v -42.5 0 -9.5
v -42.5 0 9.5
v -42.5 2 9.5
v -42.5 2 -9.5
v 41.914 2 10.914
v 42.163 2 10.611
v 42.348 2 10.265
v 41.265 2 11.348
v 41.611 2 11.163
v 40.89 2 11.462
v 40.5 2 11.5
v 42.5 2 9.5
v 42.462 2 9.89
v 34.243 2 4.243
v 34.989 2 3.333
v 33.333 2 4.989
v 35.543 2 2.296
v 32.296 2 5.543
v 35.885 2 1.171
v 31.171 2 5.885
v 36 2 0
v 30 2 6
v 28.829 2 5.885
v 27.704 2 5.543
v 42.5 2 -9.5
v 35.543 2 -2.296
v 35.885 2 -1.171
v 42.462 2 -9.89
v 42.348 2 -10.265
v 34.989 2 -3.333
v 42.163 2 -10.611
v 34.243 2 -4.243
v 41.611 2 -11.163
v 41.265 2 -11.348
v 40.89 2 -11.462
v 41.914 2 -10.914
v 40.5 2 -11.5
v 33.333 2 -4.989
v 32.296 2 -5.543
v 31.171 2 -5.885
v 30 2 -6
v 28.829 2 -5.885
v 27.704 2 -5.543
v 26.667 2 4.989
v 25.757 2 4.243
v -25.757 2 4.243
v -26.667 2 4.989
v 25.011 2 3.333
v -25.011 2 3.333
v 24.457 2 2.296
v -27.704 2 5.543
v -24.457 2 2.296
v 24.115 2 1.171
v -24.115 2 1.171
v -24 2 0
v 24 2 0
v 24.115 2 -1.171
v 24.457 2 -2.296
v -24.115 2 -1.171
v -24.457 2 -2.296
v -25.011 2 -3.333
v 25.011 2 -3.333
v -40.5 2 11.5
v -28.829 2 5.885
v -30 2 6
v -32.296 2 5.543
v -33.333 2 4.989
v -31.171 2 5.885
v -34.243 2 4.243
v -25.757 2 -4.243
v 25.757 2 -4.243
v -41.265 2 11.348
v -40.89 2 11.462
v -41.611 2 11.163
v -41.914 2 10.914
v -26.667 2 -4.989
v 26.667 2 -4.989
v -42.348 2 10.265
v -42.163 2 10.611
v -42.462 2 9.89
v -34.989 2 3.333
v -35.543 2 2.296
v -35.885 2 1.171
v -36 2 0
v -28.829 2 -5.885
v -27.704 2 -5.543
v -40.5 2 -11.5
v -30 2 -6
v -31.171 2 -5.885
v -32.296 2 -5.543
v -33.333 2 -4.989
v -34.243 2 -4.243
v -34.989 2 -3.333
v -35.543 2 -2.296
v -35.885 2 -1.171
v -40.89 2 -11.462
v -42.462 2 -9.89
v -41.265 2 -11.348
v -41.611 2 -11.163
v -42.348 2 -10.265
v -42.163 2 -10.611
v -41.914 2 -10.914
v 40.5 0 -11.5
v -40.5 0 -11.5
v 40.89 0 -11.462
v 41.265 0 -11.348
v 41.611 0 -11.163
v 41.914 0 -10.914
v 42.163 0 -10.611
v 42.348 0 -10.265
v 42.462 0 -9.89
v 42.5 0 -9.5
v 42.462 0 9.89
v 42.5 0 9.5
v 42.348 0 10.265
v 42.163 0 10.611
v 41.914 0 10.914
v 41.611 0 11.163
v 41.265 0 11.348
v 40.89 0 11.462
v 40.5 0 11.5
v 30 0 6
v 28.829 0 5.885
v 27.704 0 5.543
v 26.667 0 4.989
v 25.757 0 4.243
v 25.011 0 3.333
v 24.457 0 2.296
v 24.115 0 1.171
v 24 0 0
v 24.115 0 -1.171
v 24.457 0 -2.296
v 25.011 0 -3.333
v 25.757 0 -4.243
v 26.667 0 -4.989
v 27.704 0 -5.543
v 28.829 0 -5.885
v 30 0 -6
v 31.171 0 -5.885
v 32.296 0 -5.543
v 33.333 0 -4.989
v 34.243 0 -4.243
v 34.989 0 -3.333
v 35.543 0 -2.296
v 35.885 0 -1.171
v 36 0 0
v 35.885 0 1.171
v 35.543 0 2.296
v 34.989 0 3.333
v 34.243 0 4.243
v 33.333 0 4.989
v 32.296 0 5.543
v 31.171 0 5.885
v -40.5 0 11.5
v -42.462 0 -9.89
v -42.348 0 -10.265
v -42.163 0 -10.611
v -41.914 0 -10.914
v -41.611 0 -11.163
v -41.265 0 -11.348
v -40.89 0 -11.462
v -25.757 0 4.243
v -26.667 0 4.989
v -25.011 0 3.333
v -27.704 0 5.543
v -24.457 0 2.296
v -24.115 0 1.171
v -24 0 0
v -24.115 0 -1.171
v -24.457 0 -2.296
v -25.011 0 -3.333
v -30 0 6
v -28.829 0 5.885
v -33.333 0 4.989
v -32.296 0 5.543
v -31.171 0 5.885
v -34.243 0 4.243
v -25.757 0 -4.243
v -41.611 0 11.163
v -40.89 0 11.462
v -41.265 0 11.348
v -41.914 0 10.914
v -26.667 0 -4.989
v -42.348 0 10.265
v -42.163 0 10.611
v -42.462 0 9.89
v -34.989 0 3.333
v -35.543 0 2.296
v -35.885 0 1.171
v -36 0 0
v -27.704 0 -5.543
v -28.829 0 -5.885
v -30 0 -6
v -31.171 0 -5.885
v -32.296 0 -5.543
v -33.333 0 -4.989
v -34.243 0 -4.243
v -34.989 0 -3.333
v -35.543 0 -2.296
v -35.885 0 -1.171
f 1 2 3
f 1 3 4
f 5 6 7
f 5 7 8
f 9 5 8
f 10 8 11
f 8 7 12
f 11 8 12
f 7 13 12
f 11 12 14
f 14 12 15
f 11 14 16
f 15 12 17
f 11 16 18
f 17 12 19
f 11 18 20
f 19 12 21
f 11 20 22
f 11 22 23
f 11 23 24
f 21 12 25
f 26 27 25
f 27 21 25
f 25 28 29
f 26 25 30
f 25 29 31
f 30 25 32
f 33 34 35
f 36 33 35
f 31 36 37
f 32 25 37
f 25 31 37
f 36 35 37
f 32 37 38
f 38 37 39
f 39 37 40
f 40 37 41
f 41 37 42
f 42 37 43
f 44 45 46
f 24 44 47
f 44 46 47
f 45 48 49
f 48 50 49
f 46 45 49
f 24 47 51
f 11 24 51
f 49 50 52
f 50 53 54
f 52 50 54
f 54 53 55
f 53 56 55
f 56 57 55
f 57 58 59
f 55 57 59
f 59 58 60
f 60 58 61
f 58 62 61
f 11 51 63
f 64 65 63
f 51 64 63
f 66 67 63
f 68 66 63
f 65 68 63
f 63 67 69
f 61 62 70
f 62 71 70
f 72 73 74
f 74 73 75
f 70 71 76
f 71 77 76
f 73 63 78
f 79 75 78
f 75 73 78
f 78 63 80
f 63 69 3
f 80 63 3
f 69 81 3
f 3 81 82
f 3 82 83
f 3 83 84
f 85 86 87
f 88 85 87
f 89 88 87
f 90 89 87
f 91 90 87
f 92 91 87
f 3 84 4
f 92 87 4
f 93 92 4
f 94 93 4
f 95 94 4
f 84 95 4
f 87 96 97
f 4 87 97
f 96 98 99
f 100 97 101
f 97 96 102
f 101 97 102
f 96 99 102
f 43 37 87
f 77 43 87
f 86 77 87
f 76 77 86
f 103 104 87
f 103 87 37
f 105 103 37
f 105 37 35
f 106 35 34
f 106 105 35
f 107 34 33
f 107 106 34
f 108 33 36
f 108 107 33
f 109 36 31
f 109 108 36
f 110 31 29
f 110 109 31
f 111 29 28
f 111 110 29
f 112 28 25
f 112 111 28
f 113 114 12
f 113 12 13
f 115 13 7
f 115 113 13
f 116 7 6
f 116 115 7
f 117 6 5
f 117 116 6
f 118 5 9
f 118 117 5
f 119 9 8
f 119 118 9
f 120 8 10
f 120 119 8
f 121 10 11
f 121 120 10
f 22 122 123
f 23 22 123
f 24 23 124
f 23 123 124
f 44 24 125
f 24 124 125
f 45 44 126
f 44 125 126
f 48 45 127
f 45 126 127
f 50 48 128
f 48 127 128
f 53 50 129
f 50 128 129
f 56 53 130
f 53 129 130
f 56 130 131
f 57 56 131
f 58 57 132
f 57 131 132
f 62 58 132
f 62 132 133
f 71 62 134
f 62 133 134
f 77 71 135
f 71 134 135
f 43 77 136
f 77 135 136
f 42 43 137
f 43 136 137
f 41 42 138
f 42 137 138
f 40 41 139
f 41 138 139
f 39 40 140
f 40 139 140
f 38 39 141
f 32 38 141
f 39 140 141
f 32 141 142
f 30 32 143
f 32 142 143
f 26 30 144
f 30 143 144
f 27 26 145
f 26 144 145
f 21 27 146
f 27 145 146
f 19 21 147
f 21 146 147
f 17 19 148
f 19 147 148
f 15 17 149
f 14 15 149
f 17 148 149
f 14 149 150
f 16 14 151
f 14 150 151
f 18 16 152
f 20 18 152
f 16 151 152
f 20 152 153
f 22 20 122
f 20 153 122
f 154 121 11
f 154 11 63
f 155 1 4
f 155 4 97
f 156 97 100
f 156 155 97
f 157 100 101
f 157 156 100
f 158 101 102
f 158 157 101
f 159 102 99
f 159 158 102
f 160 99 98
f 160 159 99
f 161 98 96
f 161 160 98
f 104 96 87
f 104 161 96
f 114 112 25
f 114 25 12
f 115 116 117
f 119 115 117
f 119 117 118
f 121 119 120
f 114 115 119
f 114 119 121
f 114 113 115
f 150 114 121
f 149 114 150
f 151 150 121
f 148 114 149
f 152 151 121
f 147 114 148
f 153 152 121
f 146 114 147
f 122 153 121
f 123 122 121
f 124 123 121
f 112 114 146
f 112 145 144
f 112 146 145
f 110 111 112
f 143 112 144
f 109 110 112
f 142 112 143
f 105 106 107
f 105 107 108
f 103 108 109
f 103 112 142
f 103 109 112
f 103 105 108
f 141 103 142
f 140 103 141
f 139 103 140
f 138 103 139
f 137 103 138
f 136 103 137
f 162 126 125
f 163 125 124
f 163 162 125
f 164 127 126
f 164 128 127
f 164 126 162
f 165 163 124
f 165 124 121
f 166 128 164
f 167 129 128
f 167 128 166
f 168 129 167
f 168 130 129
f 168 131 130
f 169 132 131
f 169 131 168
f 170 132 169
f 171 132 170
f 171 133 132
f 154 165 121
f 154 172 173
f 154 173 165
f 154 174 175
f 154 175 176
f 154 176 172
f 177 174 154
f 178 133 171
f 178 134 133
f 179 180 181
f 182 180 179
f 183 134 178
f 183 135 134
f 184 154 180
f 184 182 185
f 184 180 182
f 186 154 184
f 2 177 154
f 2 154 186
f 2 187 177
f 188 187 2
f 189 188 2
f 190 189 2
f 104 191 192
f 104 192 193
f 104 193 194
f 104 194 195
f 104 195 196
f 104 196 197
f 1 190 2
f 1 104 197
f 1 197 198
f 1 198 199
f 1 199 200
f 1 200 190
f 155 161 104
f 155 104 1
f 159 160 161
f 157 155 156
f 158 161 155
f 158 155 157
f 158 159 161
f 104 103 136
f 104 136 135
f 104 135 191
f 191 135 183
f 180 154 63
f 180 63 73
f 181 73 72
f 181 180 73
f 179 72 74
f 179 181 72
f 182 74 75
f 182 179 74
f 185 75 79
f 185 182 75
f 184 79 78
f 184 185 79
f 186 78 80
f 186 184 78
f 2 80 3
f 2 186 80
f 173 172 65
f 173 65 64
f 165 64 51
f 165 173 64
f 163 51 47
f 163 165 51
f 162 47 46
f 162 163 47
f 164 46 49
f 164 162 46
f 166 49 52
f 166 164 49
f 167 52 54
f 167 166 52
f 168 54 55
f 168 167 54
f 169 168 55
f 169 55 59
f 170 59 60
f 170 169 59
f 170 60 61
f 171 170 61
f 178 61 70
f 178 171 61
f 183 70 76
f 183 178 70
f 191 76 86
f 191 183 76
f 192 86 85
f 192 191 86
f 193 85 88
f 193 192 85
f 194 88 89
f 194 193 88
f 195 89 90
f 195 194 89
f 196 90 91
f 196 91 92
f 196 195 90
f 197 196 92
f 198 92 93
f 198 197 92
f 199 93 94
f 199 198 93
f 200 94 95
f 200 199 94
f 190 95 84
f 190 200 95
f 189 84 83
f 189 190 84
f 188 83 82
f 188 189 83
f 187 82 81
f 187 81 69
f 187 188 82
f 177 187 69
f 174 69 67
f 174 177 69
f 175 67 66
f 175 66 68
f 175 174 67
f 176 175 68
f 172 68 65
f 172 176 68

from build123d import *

# Parameters (mm, degrees)
EXTRUDE_1_DEPTH = 2


with BuildPart() as part:
    # Эскиз1 → Бобышка-Вытянуть1 (new body)
    with BuildSketch(Plane(origin=(0, 0, 0), x_dir=(1, 0, 0), z_dir=(0, 1, 0))):
        with BuildLine():
            Line((40.5, -11.5), (-40.5, -11.5))
            ThreePointArc((-40.5, -11.5), (-41.914213562, -10.914213562), (-42.5, -9.5))
            Line((-42.5, -9.5), (-42.5, 9.5))
            ThreePointArc((-42.5, 9.5), (-41.914213562, 10.914213562), (-40.5, 11.5))
            Line((-40.5, 11.5), (40.5, 11.5))
            ThreePointArc((40.5, 11.5), (41.914213562, 10.914213562), (42.5, 9.5))
            Line((42.5, 9.5), (42.5, -9.5))
            ThreePointArc((42.5, -9.5), (41.914213562, -10.914213562), (40.5, -11.5))
        make_face()
        with BuildLine():
            ThreePointArc((-30, 6), (-36, 0), (-30, -6))
            ThreePointArc((-30, -6), (-24, 0), (-30, 6))
        make_face(mode=Mode.SUBTRACT)
        with BuildLine():
            ThreePointArc((30, 6), (36, 0), (30, -6))
            ThreePointArc((30, -6), (24, 0), (30, 6))
        make_face(mode=Mode.SUBTRACT)
    extrude(amount=EXTRUDE_1_DEPTH)


solid = part.part
